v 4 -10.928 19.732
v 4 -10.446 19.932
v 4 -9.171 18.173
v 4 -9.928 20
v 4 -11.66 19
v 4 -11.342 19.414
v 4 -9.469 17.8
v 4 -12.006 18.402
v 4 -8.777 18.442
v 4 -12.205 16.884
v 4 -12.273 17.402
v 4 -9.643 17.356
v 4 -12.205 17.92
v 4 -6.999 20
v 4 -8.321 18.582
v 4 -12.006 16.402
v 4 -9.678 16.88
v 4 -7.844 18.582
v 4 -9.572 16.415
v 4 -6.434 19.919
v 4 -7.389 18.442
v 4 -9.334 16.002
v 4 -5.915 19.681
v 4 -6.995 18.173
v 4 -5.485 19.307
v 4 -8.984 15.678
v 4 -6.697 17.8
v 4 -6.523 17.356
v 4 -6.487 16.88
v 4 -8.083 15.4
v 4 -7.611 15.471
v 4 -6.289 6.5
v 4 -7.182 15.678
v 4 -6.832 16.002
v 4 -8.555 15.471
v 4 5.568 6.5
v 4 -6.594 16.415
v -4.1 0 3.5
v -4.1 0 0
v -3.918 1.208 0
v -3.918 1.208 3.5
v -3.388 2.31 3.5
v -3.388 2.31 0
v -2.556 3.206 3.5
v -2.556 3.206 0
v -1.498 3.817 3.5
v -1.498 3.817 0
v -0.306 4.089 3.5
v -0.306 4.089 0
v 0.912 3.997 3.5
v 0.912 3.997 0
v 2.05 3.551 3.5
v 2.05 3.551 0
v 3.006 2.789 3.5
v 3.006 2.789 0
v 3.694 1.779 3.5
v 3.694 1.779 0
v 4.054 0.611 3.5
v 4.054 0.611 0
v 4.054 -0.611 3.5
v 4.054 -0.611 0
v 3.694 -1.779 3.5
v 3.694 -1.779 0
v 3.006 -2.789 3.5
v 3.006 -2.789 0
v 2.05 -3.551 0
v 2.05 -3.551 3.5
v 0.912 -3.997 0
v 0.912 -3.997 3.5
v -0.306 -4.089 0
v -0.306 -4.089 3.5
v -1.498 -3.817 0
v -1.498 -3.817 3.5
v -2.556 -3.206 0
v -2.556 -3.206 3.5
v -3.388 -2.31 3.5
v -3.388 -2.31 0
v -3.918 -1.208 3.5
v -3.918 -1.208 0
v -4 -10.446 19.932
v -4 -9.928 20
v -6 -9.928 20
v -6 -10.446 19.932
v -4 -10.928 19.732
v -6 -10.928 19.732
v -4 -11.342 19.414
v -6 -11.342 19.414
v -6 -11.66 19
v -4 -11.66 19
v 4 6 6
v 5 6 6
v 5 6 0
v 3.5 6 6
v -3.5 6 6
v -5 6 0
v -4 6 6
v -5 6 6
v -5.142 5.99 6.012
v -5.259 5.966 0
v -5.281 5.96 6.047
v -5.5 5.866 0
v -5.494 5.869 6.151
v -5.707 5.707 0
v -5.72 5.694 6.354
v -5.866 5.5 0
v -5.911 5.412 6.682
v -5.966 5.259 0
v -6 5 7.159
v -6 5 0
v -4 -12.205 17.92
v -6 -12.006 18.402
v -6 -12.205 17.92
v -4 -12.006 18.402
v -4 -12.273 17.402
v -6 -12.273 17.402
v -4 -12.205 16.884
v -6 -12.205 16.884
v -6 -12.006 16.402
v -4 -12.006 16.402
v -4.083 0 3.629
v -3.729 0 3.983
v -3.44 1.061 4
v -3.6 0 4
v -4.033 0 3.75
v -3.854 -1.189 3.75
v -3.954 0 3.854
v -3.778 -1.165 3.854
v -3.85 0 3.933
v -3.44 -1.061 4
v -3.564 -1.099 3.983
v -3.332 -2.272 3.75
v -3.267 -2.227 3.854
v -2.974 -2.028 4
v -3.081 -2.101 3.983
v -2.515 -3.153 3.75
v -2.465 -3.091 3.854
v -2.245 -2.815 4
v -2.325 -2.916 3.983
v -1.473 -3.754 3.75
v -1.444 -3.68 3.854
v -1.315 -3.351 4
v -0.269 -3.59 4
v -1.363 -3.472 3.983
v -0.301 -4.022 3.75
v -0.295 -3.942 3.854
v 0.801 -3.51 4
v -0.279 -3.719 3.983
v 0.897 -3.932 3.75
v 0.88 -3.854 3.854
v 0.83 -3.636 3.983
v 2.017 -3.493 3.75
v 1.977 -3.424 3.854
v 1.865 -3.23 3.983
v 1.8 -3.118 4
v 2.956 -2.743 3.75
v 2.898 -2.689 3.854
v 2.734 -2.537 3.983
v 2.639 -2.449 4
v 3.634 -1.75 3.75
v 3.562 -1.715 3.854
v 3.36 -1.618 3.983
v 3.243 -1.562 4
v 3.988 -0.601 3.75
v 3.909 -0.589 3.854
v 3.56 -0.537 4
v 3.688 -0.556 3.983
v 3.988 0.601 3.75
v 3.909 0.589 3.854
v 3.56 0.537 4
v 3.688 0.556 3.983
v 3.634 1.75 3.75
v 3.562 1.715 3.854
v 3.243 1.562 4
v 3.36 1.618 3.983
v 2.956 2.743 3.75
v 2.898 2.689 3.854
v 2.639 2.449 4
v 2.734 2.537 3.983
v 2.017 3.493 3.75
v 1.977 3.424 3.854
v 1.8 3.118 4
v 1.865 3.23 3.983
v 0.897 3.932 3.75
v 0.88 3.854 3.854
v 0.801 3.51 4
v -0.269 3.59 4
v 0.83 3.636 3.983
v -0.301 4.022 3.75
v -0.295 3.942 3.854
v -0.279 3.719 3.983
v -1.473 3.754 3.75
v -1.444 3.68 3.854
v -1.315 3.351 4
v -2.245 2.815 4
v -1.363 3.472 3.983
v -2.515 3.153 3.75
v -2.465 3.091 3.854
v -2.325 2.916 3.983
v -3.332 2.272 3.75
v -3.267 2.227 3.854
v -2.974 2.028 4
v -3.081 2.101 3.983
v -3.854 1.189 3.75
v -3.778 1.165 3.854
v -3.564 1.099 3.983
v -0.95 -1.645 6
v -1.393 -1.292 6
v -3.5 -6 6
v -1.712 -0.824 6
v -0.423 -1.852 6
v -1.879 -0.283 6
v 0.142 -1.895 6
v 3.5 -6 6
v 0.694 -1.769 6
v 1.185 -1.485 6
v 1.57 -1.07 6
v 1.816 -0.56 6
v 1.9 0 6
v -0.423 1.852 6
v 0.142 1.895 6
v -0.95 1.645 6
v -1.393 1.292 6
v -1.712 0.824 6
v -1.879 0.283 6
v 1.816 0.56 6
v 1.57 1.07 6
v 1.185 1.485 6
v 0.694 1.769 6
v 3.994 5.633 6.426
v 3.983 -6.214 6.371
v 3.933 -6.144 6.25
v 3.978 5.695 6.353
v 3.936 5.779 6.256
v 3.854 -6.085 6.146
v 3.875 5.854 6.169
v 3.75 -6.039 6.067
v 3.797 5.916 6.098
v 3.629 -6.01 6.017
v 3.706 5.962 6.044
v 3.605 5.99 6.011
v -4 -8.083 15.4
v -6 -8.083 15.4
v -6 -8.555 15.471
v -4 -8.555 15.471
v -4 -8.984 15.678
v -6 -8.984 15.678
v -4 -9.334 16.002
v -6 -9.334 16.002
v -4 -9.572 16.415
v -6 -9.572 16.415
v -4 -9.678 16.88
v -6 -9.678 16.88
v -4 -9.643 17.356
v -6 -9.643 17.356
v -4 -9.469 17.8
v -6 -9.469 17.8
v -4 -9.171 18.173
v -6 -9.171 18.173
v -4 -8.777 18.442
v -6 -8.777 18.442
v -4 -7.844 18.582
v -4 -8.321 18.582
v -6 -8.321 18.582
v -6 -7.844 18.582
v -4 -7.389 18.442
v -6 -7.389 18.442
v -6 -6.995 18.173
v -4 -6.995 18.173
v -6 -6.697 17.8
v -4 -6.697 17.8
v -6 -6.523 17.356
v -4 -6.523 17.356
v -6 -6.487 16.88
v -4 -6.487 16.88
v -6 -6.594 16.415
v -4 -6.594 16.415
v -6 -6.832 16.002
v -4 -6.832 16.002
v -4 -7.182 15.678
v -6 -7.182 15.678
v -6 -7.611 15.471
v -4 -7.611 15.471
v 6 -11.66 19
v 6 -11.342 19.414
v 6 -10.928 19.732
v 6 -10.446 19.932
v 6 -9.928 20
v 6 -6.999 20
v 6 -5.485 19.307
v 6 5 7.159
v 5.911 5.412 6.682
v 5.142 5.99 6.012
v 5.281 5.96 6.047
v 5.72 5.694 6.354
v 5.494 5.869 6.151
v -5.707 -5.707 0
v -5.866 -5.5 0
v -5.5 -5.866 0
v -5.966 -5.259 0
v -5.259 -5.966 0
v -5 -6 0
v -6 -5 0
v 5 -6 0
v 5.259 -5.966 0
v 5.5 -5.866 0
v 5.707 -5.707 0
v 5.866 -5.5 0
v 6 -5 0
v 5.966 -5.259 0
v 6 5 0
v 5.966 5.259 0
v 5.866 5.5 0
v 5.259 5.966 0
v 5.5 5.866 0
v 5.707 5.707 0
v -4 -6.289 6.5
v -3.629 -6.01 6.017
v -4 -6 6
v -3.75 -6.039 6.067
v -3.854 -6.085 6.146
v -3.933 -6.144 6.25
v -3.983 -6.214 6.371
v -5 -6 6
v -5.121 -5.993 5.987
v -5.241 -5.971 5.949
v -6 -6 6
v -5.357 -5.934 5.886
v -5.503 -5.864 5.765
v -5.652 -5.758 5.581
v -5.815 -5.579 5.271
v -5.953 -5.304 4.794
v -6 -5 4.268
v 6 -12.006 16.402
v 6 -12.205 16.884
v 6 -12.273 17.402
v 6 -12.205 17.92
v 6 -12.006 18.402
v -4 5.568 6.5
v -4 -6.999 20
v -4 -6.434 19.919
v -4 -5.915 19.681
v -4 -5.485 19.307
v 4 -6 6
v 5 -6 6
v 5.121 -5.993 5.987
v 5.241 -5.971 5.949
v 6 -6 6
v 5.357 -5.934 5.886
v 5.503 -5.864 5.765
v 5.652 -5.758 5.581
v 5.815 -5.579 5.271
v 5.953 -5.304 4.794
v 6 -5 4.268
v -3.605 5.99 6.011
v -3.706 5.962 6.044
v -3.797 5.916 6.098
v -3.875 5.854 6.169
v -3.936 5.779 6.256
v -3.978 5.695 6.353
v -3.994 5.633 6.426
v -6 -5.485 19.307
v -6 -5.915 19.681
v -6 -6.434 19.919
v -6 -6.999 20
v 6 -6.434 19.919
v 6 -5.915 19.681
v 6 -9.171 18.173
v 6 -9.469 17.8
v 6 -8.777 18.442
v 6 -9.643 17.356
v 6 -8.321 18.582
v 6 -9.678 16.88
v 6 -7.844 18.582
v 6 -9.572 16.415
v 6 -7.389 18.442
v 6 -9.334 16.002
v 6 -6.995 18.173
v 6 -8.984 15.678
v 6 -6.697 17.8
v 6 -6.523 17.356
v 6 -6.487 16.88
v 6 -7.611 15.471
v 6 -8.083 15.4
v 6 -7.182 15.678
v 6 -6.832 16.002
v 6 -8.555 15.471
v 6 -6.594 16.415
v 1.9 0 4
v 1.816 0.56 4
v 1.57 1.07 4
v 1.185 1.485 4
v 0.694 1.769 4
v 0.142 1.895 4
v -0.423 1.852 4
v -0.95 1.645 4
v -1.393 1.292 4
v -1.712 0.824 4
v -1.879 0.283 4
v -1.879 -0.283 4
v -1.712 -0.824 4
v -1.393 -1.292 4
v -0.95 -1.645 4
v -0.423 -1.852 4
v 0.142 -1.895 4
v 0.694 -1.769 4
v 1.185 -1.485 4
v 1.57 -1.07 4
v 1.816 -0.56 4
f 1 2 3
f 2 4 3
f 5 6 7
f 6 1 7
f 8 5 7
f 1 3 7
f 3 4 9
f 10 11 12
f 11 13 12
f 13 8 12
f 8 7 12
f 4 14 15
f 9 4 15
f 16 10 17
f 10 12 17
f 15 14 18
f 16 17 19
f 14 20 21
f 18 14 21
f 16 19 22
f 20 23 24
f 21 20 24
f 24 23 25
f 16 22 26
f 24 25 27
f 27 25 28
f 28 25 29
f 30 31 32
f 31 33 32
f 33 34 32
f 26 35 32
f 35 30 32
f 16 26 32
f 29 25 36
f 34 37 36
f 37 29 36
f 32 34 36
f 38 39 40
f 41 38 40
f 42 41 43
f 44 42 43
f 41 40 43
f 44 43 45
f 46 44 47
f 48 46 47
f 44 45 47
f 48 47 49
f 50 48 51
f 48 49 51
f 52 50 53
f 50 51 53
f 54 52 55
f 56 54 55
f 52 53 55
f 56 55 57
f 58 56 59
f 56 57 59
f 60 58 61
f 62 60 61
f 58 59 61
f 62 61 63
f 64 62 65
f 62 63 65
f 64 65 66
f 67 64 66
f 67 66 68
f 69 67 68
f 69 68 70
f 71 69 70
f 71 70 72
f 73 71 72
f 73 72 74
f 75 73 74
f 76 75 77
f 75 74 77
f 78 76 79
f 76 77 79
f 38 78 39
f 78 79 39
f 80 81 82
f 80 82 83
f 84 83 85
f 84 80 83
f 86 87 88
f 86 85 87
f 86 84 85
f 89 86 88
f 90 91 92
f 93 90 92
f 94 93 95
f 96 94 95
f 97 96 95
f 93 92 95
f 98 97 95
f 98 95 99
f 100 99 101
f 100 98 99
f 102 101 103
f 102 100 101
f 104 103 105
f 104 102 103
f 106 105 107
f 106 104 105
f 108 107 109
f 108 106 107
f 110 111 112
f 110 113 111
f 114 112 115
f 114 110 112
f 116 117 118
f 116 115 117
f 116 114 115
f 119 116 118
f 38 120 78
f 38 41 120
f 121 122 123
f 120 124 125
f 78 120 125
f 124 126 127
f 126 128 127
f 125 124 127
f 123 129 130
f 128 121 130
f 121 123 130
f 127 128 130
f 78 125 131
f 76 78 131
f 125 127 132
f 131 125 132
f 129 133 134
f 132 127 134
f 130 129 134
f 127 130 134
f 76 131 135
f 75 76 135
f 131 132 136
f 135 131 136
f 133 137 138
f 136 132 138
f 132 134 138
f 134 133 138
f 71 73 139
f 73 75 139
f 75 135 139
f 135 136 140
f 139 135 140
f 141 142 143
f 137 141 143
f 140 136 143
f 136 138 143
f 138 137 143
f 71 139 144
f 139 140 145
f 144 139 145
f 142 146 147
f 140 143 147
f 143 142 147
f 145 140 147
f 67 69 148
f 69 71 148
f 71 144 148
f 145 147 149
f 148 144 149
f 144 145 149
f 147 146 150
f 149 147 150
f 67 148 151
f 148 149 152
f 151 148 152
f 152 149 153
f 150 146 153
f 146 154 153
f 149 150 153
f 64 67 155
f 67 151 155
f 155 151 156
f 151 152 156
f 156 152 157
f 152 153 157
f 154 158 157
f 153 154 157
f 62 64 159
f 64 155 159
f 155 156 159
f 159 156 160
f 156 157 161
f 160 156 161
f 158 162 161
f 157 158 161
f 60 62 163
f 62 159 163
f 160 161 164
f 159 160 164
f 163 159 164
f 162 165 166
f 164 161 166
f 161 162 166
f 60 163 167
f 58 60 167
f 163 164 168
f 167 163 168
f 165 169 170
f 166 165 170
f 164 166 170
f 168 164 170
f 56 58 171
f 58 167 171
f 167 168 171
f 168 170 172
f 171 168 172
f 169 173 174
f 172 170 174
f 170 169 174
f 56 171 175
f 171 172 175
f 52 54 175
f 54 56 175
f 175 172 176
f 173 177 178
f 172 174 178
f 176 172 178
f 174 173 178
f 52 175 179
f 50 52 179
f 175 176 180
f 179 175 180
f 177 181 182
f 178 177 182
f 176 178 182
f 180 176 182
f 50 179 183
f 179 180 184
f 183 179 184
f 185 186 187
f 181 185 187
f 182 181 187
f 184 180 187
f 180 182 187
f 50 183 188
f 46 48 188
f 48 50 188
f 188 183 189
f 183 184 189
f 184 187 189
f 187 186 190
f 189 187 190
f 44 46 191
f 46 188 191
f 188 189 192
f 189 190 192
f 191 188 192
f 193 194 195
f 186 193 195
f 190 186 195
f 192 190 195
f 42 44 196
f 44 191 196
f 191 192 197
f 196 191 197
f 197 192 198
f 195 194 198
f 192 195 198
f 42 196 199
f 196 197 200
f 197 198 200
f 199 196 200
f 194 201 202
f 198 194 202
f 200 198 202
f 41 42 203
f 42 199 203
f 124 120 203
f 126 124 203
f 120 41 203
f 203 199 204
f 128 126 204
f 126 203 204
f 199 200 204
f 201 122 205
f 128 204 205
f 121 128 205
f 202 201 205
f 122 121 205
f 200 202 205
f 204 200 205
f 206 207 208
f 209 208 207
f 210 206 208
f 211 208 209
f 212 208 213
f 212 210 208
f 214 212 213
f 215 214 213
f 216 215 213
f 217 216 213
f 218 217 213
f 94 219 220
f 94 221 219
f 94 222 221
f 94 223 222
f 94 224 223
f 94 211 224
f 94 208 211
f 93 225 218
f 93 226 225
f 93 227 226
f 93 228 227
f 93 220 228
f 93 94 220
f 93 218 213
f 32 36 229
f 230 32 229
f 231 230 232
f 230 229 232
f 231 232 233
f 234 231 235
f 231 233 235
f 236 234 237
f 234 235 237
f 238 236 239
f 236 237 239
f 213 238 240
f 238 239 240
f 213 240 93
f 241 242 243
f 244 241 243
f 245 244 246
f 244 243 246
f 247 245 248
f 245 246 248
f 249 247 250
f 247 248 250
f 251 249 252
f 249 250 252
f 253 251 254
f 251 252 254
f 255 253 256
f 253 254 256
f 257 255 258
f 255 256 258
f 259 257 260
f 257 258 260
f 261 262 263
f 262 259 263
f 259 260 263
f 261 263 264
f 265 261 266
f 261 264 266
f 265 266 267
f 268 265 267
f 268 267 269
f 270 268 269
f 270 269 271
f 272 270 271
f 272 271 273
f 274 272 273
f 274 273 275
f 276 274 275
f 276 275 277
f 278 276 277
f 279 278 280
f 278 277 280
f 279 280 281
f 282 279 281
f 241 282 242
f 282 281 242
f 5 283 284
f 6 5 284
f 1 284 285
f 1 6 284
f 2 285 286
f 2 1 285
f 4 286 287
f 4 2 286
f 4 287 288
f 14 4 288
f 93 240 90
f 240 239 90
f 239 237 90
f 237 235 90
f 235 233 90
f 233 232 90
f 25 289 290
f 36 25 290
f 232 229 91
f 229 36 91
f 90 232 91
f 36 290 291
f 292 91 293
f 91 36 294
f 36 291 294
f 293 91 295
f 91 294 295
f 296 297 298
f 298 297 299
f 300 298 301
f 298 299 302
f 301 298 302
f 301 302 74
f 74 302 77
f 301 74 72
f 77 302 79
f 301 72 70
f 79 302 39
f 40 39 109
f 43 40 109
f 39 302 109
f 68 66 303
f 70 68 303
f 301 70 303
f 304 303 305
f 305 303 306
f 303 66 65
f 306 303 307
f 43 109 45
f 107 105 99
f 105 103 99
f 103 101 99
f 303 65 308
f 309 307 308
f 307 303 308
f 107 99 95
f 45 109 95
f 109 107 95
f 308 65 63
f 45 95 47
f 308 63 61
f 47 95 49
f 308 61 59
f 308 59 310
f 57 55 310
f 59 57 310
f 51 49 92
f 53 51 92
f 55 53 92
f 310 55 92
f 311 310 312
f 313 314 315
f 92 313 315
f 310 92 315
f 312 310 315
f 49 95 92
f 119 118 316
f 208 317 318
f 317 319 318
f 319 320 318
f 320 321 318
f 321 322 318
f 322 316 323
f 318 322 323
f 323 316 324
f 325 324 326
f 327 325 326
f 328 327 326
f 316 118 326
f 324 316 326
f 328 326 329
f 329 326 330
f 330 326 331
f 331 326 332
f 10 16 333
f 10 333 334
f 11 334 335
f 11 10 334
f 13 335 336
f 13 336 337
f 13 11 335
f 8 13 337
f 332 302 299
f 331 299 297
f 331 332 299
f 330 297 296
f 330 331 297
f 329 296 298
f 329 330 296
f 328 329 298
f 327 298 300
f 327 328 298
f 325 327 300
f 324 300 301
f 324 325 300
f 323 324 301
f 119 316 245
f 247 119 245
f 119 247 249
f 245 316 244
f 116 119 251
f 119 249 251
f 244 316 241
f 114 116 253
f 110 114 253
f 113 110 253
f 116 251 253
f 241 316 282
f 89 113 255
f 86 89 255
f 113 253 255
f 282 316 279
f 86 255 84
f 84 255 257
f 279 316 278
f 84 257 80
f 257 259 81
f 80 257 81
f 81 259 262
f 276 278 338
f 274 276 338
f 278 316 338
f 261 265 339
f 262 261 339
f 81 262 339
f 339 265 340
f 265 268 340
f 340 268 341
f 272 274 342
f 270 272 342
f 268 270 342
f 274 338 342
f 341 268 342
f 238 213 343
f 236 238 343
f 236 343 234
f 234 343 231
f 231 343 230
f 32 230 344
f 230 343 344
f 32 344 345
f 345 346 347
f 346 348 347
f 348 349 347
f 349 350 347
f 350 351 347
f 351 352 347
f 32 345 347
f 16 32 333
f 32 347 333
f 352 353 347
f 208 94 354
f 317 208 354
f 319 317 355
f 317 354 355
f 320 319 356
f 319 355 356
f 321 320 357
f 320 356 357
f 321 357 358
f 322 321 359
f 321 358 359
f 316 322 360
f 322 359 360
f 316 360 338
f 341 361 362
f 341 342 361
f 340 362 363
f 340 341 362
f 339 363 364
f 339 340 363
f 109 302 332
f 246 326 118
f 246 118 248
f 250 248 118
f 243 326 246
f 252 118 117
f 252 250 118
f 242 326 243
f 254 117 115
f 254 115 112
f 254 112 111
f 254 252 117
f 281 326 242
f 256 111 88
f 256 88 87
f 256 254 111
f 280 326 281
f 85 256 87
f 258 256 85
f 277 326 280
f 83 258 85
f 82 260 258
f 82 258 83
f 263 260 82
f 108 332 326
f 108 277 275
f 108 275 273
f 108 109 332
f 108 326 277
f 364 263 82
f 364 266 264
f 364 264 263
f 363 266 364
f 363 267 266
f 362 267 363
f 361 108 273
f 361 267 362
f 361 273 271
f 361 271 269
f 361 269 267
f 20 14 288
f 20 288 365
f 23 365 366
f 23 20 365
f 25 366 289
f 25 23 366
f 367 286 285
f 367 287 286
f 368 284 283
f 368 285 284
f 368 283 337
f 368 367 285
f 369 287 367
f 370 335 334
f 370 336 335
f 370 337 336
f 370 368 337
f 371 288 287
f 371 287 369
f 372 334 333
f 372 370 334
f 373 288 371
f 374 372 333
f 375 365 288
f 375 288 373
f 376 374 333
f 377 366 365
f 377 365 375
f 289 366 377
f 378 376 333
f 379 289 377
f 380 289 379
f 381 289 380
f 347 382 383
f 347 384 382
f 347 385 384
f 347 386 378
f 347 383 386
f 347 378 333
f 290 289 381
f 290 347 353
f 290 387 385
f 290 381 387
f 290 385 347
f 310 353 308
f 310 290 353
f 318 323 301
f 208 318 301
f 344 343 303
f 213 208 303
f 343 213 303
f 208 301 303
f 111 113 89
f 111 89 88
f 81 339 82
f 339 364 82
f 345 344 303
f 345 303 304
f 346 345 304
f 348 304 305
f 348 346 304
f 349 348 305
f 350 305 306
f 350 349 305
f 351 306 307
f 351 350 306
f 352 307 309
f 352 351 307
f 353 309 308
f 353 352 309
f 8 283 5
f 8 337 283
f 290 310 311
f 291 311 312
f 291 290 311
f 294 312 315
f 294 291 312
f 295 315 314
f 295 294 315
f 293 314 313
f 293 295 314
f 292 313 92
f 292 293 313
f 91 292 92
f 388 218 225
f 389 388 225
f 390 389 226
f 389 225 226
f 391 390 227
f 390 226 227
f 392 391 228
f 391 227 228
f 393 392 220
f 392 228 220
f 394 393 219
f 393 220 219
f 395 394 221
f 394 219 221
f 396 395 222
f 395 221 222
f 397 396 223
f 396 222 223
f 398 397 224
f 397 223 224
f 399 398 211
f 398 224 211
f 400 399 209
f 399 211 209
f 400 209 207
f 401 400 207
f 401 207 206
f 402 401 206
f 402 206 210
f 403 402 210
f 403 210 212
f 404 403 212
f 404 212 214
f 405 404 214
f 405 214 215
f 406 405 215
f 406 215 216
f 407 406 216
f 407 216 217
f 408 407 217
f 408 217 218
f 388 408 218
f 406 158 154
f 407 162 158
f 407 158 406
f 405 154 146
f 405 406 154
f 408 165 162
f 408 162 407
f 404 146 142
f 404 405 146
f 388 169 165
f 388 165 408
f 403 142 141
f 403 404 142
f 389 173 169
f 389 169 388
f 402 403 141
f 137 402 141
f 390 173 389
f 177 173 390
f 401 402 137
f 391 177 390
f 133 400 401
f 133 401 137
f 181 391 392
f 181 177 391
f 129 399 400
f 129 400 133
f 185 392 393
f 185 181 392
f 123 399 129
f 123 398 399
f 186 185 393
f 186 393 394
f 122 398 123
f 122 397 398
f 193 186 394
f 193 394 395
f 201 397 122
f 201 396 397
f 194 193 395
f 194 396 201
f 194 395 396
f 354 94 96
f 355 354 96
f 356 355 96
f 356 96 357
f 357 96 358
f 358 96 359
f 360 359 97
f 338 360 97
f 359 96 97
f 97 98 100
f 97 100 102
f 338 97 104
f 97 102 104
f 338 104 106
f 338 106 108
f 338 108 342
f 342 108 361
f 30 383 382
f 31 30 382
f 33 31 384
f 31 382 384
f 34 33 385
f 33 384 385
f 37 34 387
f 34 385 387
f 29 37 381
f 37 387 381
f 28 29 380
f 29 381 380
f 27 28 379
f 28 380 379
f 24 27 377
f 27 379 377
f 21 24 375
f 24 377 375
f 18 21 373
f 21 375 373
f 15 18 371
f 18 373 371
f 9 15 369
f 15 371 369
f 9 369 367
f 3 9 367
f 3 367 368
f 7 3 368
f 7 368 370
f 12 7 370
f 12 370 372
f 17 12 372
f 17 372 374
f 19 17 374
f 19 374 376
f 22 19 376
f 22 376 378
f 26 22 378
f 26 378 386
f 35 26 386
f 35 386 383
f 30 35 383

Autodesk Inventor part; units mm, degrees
ref_plane "YZ Plane" through (0, 0, 0) normal (1, 0, 0) x (0, 1, 0)
ref_plane "XZ Plane" through (0, 0, 0) normal (0, 1, 0) x (-1, 0, 0)
ref_plane "XY Plane" through (0, 0, 0) normal (0, 0, 1) x (1, 0, 0)
sketch "Sketch1" plane through (0, 0, 0) normal (0, 0, 1) x (1, 0, 0)
  line L0 (-6, -6) -> (6, -6)
  line L1 (6, -6) -> (6, 6)
  line L2 (6, 6) -> (-6, 6)
  line L3 (-6, 6) -> (-6, -6)
  line L4 (-6, -6) -> (6, 6) construction
  line L5 (6, -6) -> (-6, 6) construction
  point P0 (0, 0)
  dimension "d0" = 12
  dimension "d1" = 12
extrude "Extrusion1" add sketch "Sketch1" along normal blind 6
sketch "Sketch2" plane through (0, 0, 0) normal (0, 0, -1) x (-1, 0, 0)
  circle A0 centre (0, 0) radius 4.1
  dimension "d4" = 8.2
extrude "Extrusion2" cut sketch "Sketch2" against normal blind 4
sketch "Sketch3" plane through (0, 0, 6) normal (0, 0, 1) x (1, 0, 0)
  circle A0 centre (0, 0) radius 1.9
  dimension "d7" = 3.8
extrude "Extrusion3" cut sketch "Sketch3" against normal blind 2
sketch "Sketch5" plane through (6, -6, 0) normal (1, 0, 0) x (0, 0, -1)
  line L0 (0, 12) -> (-6, 12) projected
  line L1 (-6, 0) -> (-6, 12) projected
  line L2 (-6, 12) -> (-6, 0)
  line L3 (-6, 0) -> (-20, -8.0829)
  line L4 (-20, -8.0829) -> (-20, -0.0829)
  line L5 (-20, -0.0829) -> (-6, 12)
  line L6 (0, 0) -> (0, 12) projected
  point P0 (0, 6)
  point P1 (0, 6)
  dimension "d13" = 120
  dimension "d14" = 20
  dimension "d15" = 8
extrude "Extrusion5" add sketch "Sketch5" against normal blind 2
sketch "Sketch6" plane through (6, -6, 0) normal (1, 0, 0) x (0, 0, -1)
  circle A0 centre (-17, -2.0829) radius 1.6
  line L0 (0, 0) -> (0, 12) projected
  line L1 (-6, 0) -> (-20, -8.0829) projected
  line L2 (-20, -0.0829) -> (-6, 12) projected
  point P0 (0, 6)
  point P1 (0, 6)
  dimension "d18" = 3.2
  dimension "d19" = 17
  dimension "d23" = 2
extrude "Extrusion6" cut sketch "Sketch6" against normal blind 2
mirror "Mirror1" about plane through (0, 0, 0) normal (1, 0, 0) of "Extrusion5", "Extrusion6"
fillet "Fillet1" radius 1 4 edges at (-6, 6, 3) (6, 6, 3) (-6, -6, 3) (6, -6, 3)
fillet "Fillet2" radius 0.5 1 edges at (4.1, 0, 4)
fillet "Fillet3" radius 0.5 2 edges at (-4, 0, 6) (4, 0, 6)
chamfer "Chamfer1" distance 3 angle 45 2 edges at (-5, -14.0829, 20) (5, -14.0829, 20)
fillet "Fillet4" radius 2 6 edges at (-5, -11.0829, 20) (-5, -12.5829, 17.4019) (-5, -6.0829, 20) (5, -6.0829, 20) (5, -11.0829, 20) (5, -12.5829, 17.4019)
properties part number "PrzegubDolny"
